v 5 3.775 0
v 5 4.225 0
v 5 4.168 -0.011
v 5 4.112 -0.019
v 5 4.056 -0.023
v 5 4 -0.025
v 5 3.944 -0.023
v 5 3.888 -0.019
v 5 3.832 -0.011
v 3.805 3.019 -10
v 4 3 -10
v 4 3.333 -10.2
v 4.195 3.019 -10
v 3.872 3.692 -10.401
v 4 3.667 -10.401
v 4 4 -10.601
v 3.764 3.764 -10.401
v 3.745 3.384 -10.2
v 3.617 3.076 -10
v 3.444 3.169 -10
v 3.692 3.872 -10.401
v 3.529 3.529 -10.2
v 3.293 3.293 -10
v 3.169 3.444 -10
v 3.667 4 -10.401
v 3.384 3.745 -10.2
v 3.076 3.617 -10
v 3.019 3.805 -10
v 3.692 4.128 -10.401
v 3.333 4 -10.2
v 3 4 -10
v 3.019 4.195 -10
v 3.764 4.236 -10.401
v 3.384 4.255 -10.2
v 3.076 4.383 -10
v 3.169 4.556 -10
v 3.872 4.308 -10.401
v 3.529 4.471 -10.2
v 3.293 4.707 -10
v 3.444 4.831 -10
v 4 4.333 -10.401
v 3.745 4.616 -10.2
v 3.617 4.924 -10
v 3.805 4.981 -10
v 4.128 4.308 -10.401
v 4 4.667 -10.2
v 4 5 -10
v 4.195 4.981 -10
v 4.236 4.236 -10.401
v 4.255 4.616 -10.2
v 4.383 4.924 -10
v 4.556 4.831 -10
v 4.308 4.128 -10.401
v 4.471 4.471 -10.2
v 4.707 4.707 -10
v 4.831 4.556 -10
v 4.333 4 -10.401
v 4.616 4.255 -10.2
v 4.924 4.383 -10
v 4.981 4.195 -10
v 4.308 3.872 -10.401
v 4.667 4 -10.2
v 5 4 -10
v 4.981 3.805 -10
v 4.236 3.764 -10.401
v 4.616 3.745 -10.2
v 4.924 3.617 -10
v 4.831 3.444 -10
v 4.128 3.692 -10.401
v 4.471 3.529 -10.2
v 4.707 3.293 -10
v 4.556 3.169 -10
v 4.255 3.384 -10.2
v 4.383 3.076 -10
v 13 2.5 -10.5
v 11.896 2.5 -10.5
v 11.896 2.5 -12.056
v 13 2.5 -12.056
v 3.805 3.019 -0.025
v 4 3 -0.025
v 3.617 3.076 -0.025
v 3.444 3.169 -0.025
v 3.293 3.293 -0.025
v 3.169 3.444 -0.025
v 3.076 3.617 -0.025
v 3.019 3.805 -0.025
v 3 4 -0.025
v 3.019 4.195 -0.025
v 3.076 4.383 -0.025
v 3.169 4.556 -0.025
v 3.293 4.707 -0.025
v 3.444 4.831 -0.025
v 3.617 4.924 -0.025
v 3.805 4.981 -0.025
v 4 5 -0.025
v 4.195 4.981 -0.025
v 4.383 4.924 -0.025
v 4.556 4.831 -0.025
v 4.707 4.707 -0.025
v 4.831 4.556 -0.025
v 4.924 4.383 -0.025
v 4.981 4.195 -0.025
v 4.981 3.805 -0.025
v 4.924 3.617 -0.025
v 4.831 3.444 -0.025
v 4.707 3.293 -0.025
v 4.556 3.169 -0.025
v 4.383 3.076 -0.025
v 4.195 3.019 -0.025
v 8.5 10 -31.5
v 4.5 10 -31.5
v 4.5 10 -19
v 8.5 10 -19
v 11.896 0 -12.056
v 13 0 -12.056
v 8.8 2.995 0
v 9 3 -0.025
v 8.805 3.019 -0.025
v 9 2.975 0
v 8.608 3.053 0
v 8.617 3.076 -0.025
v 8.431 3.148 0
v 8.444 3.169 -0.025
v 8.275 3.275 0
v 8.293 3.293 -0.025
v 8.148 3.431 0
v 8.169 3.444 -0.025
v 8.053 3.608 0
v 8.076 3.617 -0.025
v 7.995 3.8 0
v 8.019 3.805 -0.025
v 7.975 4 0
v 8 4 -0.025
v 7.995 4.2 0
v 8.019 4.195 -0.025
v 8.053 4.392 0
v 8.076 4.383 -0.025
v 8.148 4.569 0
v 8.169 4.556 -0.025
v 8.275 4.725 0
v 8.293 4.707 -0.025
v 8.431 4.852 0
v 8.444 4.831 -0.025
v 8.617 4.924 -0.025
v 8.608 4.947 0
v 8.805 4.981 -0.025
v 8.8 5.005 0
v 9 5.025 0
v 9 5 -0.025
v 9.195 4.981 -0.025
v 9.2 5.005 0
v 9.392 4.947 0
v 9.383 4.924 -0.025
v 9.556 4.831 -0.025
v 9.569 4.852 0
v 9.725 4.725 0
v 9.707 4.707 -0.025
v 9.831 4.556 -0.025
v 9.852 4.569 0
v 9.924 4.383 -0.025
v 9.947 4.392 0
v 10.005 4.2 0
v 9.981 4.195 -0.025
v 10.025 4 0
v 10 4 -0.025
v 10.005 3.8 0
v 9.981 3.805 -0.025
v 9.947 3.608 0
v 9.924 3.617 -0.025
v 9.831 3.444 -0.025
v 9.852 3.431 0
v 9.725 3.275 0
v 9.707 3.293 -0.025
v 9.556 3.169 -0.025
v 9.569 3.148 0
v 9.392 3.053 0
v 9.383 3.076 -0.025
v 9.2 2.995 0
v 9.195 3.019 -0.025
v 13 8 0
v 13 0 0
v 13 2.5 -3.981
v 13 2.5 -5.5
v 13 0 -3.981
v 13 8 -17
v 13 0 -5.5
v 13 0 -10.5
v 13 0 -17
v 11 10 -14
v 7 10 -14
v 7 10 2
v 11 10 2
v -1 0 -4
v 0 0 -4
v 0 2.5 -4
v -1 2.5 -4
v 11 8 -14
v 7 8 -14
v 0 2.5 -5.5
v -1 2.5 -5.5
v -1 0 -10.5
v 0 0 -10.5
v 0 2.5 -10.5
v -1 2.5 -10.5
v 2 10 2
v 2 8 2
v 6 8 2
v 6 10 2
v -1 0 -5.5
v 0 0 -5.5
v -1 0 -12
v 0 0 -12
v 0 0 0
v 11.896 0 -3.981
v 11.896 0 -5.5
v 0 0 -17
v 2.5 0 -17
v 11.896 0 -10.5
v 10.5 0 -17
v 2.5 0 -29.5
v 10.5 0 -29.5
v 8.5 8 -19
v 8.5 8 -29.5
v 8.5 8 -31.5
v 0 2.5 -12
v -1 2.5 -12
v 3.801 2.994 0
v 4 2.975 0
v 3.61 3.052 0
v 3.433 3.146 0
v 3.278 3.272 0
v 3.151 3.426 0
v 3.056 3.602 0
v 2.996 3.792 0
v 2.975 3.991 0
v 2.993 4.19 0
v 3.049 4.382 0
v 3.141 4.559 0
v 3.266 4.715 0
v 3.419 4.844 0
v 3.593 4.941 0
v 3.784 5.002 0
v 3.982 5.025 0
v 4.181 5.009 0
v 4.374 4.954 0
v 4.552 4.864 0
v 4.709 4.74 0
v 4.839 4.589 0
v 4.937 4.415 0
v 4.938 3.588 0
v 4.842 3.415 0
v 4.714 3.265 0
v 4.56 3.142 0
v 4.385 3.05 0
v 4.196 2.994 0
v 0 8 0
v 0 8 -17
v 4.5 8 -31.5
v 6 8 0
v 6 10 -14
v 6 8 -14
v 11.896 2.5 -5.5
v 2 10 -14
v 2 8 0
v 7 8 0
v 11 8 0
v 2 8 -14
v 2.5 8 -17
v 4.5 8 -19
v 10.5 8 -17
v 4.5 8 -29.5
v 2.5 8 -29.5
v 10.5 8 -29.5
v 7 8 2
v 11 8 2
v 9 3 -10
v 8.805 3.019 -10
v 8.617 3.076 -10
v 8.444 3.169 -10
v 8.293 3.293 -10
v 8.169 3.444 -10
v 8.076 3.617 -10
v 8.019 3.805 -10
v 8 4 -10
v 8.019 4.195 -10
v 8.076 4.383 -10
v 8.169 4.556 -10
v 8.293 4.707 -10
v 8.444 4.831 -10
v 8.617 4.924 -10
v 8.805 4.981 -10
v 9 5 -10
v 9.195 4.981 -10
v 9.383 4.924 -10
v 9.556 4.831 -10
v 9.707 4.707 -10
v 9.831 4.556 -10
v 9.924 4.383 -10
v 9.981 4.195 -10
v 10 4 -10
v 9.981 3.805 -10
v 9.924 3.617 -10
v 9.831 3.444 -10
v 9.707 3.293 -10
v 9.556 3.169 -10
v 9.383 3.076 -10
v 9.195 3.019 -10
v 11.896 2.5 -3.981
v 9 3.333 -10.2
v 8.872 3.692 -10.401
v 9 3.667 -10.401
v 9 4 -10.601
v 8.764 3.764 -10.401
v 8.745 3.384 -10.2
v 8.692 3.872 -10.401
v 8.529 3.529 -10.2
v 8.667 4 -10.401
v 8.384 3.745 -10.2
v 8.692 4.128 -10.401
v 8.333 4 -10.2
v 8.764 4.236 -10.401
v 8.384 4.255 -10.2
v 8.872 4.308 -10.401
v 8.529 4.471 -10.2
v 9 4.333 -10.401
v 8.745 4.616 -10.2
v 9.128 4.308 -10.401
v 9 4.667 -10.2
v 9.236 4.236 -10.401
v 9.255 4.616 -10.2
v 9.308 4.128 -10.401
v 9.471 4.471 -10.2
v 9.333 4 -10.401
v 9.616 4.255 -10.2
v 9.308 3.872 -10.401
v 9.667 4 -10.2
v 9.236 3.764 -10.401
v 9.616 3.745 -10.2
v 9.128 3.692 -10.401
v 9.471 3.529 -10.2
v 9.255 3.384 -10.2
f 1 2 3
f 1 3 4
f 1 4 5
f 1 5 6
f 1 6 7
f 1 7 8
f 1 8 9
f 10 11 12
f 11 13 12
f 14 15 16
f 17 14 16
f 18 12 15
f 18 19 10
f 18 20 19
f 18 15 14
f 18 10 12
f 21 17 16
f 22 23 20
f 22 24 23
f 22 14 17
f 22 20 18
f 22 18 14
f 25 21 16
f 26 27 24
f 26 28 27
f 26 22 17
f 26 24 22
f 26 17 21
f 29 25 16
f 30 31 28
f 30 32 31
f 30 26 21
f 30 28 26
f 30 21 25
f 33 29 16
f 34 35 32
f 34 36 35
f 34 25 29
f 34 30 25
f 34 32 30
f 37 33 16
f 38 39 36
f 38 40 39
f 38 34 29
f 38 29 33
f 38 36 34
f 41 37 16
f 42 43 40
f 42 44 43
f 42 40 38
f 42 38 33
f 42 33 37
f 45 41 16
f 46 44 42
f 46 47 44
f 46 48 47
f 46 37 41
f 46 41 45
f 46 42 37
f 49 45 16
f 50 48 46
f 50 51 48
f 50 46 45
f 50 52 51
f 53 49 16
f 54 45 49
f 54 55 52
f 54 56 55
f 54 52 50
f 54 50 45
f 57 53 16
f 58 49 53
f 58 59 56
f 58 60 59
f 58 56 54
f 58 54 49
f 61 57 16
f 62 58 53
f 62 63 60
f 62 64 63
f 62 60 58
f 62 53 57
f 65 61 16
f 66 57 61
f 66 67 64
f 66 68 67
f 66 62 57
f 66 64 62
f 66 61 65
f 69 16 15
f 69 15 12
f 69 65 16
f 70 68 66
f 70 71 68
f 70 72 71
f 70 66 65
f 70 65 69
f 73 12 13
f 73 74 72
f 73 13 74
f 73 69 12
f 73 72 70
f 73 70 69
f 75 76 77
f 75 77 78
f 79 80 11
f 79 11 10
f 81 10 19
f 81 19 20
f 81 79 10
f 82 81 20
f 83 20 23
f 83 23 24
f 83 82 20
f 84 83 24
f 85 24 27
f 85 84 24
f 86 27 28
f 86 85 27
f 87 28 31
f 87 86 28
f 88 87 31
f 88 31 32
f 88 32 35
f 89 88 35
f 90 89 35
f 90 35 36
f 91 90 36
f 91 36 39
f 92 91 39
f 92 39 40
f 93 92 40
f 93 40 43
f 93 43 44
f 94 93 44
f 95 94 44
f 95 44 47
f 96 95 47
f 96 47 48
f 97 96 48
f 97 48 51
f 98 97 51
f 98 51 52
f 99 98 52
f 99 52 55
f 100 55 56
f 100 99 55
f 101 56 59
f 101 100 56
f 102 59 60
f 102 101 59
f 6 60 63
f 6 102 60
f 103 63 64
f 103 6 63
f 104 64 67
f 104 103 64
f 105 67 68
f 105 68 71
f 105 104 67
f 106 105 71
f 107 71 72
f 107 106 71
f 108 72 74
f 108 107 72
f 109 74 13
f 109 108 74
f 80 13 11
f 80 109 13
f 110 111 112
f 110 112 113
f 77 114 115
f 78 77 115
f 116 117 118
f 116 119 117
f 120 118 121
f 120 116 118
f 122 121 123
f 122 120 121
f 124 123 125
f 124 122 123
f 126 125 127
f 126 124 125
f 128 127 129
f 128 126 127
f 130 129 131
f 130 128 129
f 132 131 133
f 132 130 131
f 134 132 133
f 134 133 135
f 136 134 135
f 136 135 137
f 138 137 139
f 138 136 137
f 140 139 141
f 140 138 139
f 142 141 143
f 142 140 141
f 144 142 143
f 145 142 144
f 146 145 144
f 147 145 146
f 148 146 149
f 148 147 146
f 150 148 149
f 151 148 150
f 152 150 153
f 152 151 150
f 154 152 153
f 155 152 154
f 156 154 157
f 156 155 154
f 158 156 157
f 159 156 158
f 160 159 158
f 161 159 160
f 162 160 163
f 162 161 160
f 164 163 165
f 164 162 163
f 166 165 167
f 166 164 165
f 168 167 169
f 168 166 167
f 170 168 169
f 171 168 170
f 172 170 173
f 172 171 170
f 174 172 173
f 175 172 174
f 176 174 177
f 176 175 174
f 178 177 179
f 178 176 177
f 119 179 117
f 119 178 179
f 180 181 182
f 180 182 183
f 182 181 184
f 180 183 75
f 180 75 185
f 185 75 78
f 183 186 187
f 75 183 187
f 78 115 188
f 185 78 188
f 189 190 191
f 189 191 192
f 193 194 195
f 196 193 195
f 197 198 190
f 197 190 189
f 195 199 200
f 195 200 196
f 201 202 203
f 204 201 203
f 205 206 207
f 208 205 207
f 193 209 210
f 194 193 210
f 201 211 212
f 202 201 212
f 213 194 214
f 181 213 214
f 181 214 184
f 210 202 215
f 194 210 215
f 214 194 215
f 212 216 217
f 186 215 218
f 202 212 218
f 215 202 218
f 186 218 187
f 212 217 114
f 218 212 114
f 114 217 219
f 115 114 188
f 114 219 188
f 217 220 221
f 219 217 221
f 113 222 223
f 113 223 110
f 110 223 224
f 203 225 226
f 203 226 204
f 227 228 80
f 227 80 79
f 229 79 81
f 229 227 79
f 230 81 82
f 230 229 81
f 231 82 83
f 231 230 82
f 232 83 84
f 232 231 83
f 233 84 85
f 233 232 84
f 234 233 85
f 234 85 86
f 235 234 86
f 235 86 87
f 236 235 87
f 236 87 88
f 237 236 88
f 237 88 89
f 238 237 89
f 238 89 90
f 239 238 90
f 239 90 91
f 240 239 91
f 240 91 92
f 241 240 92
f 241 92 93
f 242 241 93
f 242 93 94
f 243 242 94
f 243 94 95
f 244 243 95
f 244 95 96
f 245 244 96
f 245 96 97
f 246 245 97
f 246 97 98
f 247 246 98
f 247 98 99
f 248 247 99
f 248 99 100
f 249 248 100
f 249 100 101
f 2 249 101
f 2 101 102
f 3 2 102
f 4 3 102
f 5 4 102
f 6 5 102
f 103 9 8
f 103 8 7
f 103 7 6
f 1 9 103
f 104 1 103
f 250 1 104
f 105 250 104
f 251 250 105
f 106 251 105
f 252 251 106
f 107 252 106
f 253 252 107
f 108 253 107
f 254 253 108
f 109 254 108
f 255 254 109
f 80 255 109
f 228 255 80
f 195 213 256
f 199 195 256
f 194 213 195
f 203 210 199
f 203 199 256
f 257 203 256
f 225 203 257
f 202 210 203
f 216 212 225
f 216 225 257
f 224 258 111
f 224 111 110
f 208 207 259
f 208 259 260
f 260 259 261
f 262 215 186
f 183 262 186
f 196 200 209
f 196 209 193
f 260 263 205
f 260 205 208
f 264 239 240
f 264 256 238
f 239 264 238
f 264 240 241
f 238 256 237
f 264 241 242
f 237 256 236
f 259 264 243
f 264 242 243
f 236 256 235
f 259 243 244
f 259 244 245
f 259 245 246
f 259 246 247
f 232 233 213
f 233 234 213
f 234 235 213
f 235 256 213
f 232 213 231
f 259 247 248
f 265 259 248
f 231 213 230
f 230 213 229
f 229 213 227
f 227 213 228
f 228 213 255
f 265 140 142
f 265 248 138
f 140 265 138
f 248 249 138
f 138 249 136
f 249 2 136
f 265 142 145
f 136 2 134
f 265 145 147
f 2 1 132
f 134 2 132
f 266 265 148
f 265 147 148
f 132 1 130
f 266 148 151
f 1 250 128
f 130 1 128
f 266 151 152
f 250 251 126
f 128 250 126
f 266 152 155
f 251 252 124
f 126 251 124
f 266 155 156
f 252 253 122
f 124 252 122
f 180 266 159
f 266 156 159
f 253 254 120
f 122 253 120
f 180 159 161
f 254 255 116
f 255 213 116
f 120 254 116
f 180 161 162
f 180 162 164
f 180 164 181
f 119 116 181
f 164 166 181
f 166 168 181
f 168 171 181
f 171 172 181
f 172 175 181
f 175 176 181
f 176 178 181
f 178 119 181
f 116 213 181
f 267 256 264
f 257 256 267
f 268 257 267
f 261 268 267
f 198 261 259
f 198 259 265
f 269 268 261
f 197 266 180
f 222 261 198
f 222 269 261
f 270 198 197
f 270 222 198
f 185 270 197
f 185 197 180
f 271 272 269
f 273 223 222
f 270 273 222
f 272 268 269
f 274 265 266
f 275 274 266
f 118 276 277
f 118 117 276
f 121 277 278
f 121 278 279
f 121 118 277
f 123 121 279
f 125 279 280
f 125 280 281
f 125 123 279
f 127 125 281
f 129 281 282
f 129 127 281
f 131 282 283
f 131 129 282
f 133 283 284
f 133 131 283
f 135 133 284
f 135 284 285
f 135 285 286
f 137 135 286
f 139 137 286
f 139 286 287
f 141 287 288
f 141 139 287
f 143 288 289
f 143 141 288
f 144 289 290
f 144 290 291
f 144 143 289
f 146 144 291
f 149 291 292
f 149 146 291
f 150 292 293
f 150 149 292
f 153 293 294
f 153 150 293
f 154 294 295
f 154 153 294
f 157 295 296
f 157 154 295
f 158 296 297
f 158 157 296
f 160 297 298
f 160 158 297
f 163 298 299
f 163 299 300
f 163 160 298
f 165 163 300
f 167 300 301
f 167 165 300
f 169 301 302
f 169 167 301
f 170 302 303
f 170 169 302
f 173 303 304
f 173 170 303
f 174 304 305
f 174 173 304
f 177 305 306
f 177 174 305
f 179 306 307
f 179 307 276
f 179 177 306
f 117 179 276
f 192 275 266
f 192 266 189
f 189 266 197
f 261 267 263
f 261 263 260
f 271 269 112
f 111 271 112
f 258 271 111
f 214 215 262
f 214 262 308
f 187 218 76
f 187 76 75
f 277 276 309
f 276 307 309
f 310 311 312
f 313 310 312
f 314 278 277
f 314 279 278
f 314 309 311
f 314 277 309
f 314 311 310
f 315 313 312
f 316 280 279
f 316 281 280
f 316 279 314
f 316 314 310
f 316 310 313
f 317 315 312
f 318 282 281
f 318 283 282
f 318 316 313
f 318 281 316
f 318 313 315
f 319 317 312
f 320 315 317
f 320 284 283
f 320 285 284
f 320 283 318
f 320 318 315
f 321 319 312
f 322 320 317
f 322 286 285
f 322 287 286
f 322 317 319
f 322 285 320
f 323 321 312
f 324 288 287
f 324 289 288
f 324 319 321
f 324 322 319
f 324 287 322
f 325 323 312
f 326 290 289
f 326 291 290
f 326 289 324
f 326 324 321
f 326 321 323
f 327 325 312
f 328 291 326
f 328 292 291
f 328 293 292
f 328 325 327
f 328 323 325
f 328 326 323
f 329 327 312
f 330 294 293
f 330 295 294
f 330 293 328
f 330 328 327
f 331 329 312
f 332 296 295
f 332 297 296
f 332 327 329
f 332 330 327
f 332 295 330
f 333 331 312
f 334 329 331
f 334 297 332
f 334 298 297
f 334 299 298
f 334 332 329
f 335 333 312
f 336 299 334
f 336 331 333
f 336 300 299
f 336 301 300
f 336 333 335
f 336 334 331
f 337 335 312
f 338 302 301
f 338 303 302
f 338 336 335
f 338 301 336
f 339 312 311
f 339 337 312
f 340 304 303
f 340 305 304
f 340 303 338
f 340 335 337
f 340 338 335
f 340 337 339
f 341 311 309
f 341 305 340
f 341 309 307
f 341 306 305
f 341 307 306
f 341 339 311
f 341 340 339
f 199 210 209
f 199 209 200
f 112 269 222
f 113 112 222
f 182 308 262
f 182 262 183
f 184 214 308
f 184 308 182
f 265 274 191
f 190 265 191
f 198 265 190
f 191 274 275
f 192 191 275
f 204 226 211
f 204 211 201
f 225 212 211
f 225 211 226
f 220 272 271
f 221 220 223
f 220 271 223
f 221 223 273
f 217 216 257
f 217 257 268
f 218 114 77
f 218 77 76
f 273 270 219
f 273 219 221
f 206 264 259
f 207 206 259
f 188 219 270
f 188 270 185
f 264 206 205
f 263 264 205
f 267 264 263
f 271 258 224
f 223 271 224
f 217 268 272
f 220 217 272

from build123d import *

# Parameters (mm, degrees)
SKETCH1_W                  = 8
SKETCH1_H                  = 17
CONNECTOR_BODY_DEPTH       = 8
SKETCH4_W                  = 4
SKETCH4_H                  = 16
CLAMP_DEPTH                = 2
CONNECTOR_PATTERN_COUNT    = 2
CONNECTOR_PATTERN_PITCH    = 5
SKETCH5_W                  = 8
SKETCH5_H                  = 12.5
SINGLE_BODY_DEPTH          = 8
SKETCH6_W                  = 1.5
SKETCH6_H                  = 2.500390225
CHAINING_NOBS_DEPTH        = 1
SKETCH7_W                  = 1.10359402
SKETCH7_H                  = 1.518729337
SKETCH7_H_2                = 1.556223895
CHAINING_NOBS_CUTOUT_DEPTH = 2.5
SKETCH8_W                  = 4
SKETCH8_H                  = 12.5
SINGLE_BODY_CLAMP_DEPTH    = 2


with BuildPart() as part:
    # Sketch1 → connector_body (new body)
    with BuildSketch(Plane(origin=(0, 0, 0), x_dir=(1, 0, 0), z_dir=(0, 1, 0))):
        with Locations((4, 8.5)):
            Rectangle(SKETCH1_W, SKETCH1_H)
    connector_body = extrude(amount=CONNECTOR_BODY_DEPTH)

    # Sketch3 → cable_hole (revolve, cut)
    with BuildSketch(Plane(origin=(4, 4, 0), x_dir=(0, -1, 0), z_dir=(1, 0, 0))):
        Polygon((0, 0), (0, 10.600860619), (1, 10), (1, 0.025), (1.025, 0), align=None)
    cable_hole = revolve(axis=Axis((4, 4, 6.35), (0, 0, -1)), mode=Mode.SUBTRACT)

    # Sketch4 → clamp (add)
    with BuildSketch(Plane(origin=(0, 8, 0), x_dir=(1, 0, 0), z_dir=(0, 1, 0))):
        with Locations((4, 6)):
            Rectangle(SKETCH4_W, SKETCH4_H)
    clamp = extrude(amount=CLAMP_DEPTH)

    # connector_pattern: connector_body, cable_hole, clamp ×2
    with Locations(*[(i * CONNECTOR_PATTERN_PITCH, 0, 0) for i in range(1, CONNECTOR_PATTERN_COUNT)]):
        add(connector_body)
        add(cable_hole, mode=Mode.SUBTRACT)
        add(clamp)

    # Sketch5 → single_body (add)
    with BuildSketch(Plane(origin=(0, 8, 0), x_dir=(1, 0, 0), z_dir=(0, 1, 0))):
        with Locations((6.5, 23.25)):
            Rectangle(SKETCH5_W, SKETCH5_H)
    extrude(amount=-SINGLE_BODY_DEPTH)

    # Sketch6 → chaining_nobs (add)
    with BuildSketch(Plane.ZY):
        with Locations((-11.25, 1.250195113)):
            Rectangle(SKETCH6_W, SKETCH6_H)
        with Locations((-4.75, 1.250195113)):
            Rectangle(SKETCH6_W, SKETCH6_H)
    extrude(amount=CHAINING_NOBS_DEPTH)

    # Sketch7 → chaining_nobs_cutout (cut)
    with BuildSketch(Plane.XZ):
        with Locations((12.44820299, -4.740635332)):
            Rectangle(SKETCH7_W, SKETCH7_H)
        with Locations((12.44820299, -11.278111948)):
            Rectangle(SKETCH7_W, SKETCH7_H_2)
    extrude(amount=-CHAINING_NOBS_CUTOUT_DEPTH, mode=Mode.SUBTRACT)

    # Sketch8 → single_body_clamp (add)
    with BuildSketch(Plane(origin=(0, 8, 0), x_dir=(1, 0, 0), z_dir=(0, 1, 0))):
        with Locations((6.5, 25.25)):
            Rectangle(SKETCH8_W, SKETCH8_H)
    extrude(amount=SINGLE_BODY_CLAMP_DEPTH)


solid = part.part
